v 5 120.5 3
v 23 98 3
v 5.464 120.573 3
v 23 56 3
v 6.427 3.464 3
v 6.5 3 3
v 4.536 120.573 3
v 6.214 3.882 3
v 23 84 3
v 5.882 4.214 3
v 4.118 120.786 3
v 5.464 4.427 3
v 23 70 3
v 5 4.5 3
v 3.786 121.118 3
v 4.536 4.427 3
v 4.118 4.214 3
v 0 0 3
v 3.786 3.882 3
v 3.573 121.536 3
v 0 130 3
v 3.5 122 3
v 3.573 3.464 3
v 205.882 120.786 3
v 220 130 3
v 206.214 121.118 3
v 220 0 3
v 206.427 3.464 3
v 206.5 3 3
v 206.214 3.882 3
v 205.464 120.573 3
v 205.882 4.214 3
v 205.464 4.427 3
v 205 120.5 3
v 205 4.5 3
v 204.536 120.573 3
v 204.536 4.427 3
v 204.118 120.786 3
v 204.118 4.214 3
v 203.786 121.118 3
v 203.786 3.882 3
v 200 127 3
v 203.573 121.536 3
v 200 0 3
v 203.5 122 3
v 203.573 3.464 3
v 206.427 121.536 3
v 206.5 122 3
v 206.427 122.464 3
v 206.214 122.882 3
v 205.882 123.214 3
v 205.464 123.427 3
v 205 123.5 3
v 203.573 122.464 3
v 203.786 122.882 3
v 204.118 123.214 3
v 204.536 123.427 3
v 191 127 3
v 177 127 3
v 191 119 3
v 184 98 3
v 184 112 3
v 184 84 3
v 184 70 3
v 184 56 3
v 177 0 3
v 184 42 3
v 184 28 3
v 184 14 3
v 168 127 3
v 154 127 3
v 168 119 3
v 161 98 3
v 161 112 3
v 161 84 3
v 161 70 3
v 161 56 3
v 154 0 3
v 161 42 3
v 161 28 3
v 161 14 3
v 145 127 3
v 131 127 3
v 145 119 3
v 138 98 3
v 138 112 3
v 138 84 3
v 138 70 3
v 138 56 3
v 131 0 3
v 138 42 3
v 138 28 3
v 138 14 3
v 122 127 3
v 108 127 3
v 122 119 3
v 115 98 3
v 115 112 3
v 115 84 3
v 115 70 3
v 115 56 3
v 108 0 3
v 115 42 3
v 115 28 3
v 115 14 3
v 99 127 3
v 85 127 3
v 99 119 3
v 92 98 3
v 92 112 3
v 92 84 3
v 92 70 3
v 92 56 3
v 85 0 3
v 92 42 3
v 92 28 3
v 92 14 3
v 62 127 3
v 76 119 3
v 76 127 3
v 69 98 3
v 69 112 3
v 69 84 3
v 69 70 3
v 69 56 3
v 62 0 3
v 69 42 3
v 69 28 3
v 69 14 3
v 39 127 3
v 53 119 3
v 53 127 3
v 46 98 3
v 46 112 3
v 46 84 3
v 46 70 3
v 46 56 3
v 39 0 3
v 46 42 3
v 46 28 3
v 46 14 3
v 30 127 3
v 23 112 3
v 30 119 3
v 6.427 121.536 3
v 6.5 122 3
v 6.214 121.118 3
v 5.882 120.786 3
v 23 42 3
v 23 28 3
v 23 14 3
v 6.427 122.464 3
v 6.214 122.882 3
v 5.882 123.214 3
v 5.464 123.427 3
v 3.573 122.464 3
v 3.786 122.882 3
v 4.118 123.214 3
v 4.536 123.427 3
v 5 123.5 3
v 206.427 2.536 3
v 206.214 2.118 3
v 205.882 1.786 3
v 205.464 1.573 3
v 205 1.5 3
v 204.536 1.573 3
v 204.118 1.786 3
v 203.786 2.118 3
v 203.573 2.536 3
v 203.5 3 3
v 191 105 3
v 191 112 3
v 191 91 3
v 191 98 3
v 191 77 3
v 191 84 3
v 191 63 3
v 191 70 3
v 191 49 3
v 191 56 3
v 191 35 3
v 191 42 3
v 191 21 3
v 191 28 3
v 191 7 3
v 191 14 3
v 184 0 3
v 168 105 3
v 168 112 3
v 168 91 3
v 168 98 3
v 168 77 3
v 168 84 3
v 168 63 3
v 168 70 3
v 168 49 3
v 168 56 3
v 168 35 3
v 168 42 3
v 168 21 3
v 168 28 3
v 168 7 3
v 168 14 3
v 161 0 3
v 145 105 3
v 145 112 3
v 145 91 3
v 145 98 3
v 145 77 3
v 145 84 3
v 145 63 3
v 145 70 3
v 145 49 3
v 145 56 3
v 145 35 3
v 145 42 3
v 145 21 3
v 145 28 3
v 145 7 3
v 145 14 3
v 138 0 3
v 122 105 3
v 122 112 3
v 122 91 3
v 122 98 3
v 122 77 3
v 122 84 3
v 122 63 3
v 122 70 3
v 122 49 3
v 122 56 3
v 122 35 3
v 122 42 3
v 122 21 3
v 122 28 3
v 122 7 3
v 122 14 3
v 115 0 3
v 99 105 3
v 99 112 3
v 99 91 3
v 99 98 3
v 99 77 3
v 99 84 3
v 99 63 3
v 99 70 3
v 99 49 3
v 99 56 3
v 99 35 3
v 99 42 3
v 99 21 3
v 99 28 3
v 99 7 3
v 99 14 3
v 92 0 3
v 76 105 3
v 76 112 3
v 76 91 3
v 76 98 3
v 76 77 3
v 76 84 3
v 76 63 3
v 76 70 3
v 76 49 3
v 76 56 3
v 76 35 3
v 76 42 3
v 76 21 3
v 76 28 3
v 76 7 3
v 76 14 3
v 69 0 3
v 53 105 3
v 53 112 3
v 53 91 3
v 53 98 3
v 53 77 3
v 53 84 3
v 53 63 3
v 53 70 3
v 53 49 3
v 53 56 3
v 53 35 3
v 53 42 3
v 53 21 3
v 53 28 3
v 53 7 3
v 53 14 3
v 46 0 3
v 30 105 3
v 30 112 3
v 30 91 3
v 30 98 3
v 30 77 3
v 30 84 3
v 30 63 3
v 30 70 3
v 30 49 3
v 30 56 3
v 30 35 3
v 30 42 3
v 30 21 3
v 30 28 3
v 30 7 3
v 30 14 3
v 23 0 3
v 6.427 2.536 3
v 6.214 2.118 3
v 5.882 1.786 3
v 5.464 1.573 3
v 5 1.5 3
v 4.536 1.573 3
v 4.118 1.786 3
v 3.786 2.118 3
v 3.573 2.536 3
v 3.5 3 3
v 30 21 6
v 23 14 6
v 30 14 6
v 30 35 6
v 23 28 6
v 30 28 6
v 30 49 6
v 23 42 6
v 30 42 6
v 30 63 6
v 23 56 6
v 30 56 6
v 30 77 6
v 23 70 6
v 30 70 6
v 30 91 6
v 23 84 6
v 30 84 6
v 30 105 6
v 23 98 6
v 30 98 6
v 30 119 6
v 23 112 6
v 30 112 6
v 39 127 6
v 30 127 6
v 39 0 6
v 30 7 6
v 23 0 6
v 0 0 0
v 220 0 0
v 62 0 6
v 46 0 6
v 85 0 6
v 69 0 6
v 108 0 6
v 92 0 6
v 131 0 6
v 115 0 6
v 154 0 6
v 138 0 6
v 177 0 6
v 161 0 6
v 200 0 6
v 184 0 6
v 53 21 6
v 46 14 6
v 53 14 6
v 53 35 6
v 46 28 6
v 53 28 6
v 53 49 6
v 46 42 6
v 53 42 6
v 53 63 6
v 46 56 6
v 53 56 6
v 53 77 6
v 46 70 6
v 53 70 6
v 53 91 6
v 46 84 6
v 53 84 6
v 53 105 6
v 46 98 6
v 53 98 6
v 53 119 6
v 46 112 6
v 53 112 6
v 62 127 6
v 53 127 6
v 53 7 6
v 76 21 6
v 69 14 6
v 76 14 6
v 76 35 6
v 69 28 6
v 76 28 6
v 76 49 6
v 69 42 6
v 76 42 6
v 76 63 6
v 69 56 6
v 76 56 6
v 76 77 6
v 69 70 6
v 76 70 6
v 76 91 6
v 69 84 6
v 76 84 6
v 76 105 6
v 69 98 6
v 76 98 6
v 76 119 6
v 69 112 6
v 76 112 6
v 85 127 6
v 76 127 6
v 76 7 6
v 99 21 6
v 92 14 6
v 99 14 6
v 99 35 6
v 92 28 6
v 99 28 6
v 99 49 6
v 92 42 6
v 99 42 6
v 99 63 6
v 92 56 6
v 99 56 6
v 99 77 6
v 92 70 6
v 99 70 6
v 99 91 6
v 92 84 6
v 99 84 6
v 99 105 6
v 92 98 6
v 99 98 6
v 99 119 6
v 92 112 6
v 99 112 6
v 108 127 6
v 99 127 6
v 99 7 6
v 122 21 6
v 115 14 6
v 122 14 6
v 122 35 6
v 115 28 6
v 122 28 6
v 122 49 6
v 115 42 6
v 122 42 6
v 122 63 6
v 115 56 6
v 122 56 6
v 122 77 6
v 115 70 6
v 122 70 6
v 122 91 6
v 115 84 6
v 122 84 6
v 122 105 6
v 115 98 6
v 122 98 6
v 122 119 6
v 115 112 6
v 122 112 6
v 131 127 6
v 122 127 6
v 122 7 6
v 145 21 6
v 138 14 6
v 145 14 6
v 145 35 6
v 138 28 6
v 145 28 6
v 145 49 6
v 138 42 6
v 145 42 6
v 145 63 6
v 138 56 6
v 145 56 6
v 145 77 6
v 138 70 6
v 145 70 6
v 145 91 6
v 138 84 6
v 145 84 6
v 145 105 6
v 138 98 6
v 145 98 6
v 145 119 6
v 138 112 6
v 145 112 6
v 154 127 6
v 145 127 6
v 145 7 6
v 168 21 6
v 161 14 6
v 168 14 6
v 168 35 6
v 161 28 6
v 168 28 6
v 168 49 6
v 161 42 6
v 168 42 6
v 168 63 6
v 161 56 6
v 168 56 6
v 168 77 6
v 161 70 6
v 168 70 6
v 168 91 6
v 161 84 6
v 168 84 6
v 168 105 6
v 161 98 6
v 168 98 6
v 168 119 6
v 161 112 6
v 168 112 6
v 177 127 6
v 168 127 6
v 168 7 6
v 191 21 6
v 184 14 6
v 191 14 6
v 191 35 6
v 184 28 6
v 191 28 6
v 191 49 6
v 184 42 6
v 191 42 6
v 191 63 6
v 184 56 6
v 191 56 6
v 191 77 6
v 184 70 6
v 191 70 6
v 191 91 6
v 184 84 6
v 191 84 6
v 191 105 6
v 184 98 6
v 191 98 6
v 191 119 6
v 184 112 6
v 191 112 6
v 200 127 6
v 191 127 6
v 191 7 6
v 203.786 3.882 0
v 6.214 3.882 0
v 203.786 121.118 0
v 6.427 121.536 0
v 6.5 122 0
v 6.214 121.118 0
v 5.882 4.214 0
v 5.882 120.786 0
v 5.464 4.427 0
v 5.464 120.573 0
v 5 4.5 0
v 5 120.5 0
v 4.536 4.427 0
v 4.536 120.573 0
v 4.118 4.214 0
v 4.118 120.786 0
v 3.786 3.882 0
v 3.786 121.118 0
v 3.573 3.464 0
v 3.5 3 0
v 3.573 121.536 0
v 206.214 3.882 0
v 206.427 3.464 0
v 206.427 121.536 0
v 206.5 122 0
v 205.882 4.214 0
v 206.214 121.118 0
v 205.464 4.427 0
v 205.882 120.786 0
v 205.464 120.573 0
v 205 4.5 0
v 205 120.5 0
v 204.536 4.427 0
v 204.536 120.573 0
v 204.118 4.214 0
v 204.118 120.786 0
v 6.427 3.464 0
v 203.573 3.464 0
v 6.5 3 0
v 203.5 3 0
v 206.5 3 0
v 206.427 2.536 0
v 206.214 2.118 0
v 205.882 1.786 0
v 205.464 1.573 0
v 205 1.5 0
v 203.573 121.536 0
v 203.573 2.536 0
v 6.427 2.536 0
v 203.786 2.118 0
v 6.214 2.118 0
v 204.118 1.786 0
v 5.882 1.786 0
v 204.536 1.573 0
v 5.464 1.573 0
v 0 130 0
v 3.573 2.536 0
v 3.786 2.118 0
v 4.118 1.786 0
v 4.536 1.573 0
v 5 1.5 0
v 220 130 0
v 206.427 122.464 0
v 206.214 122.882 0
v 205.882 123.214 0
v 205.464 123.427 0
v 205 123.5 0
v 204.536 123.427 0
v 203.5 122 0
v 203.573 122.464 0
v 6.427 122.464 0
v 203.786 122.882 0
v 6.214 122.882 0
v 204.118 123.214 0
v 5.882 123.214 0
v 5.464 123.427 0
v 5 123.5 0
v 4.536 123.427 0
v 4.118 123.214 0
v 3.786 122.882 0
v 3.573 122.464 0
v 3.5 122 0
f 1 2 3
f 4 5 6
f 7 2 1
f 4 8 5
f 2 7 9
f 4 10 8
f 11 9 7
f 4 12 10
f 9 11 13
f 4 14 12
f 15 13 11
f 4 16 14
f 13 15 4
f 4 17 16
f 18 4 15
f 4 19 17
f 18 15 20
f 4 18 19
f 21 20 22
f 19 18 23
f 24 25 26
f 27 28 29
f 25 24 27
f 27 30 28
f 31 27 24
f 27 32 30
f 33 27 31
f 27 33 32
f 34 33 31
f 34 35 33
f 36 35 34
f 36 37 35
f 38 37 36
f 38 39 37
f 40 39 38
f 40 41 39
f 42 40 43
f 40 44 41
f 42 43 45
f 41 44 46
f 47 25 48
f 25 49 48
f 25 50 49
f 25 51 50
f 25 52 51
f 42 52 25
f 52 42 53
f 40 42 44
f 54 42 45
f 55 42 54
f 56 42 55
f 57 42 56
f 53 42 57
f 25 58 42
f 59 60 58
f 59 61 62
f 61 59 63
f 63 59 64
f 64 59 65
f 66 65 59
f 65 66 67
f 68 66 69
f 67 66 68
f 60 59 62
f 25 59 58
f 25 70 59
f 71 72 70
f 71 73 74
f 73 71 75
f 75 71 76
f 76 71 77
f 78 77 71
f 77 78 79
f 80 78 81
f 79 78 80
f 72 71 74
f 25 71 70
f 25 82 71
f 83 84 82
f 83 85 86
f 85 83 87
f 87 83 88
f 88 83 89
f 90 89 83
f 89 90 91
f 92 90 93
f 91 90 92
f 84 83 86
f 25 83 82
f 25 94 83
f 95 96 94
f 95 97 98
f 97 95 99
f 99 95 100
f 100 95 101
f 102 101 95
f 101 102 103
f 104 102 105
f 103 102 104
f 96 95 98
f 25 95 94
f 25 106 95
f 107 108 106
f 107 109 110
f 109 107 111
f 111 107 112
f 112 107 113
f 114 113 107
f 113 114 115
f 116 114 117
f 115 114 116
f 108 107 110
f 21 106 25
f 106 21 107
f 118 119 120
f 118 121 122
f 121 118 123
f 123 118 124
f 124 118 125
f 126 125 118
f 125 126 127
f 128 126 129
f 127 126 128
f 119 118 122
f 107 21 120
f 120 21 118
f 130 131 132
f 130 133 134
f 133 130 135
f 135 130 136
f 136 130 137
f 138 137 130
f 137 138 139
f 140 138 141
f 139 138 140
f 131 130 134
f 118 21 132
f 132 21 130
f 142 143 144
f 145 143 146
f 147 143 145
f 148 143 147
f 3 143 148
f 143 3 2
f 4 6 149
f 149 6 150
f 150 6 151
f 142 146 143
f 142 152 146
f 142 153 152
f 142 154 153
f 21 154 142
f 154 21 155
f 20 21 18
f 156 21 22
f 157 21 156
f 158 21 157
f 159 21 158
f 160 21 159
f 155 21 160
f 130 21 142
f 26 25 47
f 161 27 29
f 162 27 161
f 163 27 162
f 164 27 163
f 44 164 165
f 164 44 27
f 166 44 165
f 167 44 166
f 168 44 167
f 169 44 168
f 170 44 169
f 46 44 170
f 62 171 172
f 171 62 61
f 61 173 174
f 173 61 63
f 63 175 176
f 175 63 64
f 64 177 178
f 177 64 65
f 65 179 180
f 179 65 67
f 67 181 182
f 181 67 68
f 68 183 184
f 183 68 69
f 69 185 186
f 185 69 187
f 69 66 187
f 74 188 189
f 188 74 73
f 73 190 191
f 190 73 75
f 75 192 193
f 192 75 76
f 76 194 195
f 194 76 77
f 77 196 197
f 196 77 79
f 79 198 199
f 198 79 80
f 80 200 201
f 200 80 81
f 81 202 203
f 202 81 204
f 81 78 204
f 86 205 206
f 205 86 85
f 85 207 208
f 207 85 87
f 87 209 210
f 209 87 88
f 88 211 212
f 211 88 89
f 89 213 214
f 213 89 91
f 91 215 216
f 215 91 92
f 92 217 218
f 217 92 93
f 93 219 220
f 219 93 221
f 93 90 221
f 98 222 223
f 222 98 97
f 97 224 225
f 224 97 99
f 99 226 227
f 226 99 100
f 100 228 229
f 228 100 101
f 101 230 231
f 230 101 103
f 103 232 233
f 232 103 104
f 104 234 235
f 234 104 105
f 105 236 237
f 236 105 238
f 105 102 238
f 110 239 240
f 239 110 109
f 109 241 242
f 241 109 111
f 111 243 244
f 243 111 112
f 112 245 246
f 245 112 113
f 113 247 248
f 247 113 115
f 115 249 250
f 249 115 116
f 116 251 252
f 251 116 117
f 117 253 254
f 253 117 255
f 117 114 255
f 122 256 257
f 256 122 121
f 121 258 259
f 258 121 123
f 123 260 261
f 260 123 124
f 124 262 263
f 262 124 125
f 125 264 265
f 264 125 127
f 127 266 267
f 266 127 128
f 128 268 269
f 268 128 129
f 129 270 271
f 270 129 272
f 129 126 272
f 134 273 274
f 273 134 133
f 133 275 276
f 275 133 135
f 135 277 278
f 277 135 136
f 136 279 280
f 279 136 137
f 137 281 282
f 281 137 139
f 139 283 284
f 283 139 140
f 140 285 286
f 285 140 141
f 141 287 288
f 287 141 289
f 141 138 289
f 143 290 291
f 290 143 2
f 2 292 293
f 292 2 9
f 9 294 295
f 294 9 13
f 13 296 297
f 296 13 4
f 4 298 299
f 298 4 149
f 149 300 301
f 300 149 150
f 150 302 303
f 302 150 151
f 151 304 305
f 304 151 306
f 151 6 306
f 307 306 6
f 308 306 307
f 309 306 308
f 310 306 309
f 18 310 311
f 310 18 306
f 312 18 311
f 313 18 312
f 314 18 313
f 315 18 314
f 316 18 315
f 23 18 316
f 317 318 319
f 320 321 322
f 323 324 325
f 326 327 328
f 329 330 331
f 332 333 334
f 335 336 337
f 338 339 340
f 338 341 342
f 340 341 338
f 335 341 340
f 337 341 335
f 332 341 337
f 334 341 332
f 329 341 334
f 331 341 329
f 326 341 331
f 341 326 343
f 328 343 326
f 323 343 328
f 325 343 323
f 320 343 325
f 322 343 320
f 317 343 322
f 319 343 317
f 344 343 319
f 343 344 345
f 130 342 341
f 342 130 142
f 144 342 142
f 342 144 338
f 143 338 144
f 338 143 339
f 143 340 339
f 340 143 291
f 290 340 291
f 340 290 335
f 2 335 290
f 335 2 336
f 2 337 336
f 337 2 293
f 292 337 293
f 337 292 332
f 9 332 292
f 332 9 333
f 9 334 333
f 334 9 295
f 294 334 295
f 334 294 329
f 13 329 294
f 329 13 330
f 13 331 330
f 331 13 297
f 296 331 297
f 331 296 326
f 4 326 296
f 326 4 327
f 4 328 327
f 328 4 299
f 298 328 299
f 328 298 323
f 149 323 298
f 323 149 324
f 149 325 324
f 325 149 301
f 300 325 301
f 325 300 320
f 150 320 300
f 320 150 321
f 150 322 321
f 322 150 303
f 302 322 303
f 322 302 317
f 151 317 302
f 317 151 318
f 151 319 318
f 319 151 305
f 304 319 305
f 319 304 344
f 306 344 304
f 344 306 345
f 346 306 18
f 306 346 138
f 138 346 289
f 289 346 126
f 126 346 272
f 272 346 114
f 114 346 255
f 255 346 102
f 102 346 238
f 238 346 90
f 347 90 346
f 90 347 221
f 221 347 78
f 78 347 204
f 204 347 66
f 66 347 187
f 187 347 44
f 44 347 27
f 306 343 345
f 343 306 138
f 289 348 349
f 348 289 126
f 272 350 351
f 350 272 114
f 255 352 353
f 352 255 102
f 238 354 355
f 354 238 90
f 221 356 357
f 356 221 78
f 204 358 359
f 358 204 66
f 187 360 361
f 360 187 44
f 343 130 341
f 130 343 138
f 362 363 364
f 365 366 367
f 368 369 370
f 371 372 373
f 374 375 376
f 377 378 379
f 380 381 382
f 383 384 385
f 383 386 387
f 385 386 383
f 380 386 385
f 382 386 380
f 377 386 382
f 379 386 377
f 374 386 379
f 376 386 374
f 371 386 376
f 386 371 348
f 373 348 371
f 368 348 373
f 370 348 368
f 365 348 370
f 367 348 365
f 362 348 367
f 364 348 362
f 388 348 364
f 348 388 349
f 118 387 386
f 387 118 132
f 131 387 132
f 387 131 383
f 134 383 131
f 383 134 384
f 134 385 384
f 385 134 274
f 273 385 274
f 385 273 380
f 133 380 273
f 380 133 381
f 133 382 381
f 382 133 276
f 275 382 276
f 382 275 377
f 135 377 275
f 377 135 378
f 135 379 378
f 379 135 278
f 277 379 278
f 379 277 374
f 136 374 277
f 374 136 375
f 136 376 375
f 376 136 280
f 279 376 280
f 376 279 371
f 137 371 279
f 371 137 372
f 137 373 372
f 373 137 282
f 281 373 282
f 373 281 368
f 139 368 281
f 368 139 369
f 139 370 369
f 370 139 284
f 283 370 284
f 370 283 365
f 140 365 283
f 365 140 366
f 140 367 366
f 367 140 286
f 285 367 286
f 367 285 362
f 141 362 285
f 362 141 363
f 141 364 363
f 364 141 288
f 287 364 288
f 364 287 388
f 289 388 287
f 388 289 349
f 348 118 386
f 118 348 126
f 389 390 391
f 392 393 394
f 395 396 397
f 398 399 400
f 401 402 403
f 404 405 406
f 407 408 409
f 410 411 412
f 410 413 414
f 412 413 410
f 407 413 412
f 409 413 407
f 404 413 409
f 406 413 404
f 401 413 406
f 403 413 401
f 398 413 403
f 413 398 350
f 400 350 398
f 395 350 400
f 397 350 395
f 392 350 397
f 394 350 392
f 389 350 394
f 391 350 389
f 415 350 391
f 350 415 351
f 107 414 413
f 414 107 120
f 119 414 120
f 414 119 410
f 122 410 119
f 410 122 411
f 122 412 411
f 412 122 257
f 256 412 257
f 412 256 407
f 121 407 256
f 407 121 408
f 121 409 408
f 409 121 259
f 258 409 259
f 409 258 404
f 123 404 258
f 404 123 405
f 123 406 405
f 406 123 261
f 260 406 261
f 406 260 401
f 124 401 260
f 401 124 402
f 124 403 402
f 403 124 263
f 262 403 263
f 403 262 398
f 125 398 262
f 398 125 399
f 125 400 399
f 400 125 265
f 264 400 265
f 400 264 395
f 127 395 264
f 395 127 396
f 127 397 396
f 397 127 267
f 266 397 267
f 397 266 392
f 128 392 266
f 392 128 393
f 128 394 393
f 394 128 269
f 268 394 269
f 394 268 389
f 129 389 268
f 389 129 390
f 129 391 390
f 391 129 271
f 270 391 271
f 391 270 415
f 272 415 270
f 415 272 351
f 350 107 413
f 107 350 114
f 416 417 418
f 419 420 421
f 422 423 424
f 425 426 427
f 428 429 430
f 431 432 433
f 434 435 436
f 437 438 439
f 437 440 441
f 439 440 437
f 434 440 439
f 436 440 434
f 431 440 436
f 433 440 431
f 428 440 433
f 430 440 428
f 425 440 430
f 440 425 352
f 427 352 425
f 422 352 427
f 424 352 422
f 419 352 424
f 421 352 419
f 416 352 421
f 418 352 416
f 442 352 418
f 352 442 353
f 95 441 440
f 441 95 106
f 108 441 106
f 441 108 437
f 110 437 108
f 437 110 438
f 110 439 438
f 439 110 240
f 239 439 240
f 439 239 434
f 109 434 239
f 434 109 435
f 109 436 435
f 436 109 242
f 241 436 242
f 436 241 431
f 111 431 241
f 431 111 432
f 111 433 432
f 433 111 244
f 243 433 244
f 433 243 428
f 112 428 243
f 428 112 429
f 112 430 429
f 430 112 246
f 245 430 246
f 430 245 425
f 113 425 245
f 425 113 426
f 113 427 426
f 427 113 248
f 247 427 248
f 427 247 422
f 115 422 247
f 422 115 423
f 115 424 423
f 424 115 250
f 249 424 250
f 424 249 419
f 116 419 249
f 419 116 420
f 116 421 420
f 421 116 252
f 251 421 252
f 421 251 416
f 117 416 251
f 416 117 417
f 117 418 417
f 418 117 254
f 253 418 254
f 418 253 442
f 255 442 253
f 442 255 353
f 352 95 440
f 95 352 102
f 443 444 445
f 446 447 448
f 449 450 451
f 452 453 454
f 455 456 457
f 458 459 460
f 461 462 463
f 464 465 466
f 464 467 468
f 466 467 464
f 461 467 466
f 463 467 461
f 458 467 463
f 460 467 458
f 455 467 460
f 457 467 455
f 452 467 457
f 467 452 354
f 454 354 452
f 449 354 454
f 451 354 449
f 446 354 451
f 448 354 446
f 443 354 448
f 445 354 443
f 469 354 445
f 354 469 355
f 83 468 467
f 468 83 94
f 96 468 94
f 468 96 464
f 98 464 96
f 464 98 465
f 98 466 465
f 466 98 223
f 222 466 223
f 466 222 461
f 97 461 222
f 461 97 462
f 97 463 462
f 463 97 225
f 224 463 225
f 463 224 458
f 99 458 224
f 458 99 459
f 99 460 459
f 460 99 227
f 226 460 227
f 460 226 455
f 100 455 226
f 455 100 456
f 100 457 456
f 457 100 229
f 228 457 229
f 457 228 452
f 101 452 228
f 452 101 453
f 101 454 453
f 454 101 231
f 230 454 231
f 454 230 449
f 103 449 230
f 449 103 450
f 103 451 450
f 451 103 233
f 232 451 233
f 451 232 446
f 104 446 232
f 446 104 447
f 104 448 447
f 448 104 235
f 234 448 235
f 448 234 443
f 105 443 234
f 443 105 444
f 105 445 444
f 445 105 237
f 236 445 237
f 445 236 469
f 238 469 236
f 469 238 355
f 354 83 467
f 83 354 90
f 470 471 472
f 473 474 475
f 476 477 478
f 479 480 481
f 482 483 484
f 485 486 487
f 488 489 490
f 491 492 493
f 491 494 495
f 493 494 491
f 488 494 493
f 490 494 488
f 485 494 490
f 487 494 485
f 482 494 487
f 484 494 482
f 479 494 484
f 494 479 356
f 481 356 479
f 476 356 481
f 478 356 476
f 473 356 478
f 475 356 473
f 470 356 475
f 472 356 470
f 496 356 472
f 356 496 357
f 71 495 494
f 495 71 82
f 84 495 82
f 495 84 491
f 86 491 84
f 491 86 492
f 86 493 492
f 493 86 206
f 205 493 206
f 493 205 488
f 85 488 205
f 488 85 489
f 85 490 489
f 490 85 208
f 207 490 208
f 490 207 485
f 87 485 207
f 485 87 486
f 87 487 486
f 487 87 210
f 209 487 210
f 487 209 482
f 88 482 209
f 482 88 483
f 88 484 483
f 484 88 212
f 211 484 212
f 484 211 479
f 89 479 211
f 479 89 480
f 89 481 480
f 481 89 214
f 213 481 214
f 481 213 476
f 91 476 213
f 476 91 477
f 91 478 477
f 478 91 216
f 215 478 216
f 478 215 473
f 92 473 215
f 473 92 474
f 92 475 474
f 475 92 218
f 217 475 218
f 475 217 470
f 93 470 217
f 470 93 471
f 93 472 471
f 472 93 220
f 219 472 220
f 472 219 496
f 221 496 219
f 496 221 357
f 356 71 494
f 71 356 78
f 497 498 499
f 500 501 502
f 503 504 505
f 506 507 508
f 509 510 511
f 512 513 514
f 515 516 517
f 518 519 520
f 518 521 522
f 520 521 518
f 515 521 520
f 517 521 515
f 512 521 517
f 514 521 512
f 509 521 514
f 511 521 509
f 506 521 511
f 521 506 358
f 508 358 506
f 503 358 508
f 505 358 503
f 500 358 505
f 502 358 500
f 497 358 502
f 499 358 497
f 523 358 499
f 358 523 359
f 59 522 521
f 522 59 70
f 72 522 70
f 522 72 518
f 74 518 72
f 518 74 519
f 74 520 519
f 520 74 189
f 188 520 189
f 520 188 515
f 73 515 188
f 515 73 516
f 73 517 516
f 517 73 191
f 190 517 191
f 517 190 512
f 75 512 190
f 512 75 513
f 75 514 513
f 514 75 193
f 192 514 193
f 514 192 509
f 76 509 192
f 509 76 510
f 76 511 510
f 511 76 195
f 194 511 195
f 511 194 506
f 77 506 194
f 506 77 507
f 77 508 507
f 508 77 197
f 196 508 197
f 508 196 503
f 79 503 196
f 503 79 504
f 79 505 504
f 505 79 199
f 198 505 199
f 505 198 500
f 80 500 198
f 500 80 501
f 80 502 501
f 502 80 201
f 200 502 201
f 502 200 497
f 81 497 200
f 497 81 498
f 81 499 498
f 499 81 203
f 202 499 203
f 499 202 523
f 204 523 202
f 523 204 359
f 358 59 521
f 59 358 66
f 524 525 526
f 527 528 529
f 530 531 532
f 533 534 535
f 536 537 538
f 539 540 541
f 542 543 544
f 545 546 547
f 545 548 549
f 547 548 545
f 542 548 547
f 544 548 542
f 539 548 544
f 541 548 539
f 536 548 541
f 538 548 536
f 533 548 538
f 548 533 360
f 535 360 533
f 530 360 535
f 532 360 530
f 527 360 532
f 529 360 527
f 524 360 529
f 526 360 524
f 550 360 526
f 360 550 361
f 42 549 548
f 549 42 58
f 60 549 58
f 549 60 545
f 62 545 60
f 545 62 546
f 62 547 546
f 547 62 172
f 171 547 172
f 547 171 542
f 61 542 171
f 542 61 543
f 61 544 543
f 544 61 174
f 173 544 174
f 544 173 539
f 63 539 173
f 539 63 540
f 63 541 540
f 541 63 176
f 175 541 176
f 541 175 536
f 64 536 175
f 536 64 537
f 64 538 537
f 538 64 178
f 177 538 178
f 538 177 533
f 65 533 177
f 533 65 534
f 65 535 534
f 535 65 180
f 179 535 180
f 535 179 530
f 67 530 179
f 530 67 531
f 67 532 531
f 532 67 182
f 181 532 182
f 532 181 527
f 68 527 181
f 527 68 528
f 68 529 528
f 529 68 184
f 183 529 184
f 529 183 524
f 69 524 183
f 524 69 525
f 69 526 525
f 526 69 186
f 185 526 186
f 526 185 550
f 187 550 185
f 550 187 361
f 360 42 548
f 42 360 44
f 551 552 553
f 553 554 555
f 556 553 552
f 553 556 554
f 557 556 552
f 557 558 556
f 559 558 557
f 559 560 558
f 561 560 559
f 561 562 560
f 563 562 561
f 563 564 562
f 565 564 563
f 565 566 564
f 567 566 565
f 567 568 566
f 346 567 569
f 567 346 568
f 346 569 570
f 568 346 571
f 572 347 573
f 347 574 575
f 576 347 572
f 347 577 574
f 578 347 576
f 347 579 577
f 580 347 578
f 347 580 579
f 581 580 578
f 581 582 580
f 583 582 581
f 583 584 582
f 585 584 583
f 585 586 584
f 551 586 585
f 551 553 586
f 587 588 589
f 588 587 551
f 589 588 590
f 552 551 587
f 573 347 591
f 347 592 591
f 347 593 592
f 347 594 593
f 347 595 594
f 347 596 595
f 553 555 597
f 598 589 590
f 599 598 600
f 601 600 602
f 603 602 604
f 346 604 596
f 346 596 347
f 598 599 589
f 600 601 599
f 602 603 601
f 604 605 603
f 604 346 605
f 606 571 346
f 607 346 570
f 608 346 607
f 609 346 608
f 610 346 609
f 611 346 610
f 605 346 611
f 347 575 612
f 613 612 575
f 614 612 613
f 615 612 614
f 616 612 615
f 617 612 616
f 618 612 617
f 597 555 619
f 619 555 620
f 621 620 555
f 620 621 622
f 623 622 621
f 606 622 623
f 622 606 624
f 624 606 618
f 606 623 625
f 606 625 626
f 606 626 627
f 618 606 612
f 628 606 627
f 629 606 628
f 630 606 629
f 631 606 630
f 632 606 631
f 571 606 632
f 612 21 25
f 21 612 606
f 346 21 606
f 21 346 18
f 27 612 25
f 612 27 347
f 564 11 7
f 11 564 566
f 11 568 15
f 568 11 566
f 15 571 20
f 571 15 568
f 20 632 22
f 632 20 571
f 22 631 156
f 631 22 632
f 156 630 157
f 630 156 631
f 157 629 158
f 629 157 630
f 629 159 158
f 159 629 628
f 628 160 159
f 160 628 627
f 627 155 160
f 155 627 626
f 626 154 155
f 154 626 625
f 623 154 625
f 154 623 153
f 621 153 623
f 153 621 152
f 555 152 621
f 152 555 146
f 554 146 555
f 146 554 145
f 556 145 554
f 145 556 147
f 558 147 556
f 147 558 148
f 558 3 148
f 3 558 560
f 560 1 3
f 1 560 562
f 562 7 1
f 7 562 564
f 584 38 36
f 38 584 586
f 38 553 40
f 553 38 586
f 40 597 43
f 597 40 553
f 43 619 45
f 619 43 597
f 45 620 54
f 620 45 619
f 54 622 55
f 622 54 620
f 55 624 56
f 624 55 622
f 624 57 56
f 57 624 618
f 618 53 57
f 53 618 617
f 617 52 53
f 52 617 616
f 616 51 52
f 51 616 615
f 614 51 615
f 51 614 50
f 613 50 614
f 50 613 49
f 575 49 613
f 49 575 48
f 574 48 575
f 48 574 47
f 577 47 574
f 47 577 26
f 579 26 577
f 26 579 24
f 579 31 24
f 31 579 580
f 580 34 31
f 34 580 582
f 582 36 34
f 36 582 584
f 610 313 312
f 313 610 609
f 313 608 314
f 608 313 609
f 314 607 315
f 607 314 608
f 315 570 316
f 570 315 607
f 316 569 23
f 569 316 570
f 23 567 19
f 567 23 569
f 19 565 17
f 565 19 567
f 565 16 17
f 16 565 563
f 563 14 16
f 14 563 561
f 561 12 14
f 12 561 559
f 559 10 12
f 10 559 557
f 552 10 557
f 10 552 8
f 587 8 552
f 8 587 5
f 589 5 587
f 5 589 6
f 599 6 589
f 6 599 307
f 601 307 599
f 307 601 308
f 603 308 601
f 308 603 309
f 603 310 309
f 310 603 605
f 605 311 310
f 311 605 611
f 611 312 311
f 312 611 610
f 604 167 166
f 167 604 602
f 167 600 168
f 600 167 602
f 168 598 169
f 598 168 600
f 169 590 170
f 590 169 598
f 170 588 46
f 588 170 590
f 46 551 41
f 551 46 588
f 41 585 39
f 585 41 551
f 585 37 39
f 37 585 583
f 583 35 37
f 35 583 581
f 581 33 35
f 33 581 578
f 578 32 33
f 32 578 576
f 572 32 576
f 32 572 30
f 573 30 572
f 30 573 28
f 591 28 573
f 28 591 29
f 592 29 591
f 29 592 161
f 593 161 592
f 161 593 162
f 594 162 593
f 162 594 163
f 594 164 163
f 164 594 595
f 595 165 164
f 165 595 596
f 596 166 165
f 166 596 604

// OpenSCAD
// file: globs.scad
/* Global definitions for millihertz 5 */

// Ball bearings are sold as 6mm. We have seen two
// versions, one at 6.35mm (1/4") and one at 6.15mm.

ball_bearing_diameter = 6.35;
ball_bearing_radius = ball_bearing_diameter / 2;
pipe_outer_diameter = 11;

/* All dimensions are in millimetres */
memory_slope = 10; // Degrees

/** Memory cell pitch - the horizontal and vertical distances between one row and the next. Memory is arranged so one column (y) make up one word. Words are laid out vertically. */
memory_cell_pitch_x = 16;
memory_cell_pitch_y = 28 * cos(memory_slope);

// Max wire diameter is 1.59mm for 6.35mm ball bearings.
stage1_wire_diameter = 1.45; // Equivalent to AWG 15 / SWG 17.
stage2_wire_diameter = 2.337; // SWG 13

/* Number of bits used in the data. This must be 32. */
bits = 32;

/* Global pitch - the horizontal spacing between each bit */
pitch = 23;

/** Frame */

frame_internal_width = 900;
frame_internal_height = 2200;

/** Frame will probably be 50mm angle iron */
frame_width = 50;

/* Bowden cable specs based on lightweight 'snake' cable */

bowden_cable_inner_diameter = 2;
bowden_cable_outer_diameter = 3.5;

bowden_cable_travel = 10;

/* Specific names for the subtractor */
subtractor_pitch_x = pitch;
subtractor_pitch_y = 27;

memory_columns_per_cell = 8;

// Memory cell height
cell_height = 14;

// Gap between two memory cell units - allows for the last useless row
// in the cell and a gap of 20 to place a delay unit if necessary. The
// delay unit may be needed to slow the ball bearing to avoid damage to
// memory selectors.
memory_unit_gap = cell_height+20;

// centre_gap is a split in the middle of the two lanes
// to join cells together (since we will likely have two
// 16-bit memory cells, and 2 16-bit adders, there will
// be a gap needed to join them.
centre_gap = 50;

/* Colour for illustrating ball bearing paths */

bb_trace_colour = [0.5,0.0,0.0,0.5];


channel_width = 7; // Width of channels ball bearings roll in

columns_per_block = 8; // Number of columns in each injector/diverter block

// Used mainly by injector
function ejector_xpos(col) = 20+col*pitch+channel_width/2;
// main file
/* Vertical configurable memory cell, 3D assembly; second version with
   less manual assembly less possibility of binding */

include <globs.scad>;

columns = memory_columns_per_cell;
rows = 8;
column_width = 7; // Must be bigger than bb diameter

joiner_extension = 2;
column_spacing = (column_width*3+joiner_extension); // This is no longer relevant, but necessary to calculate the mounting holes

module base_plate_2d()
{
  difference() {
    square([220,130]);

    // Mounting holes to match the v1 vertical memory
    for(x=[5, column_spacing*columns+21]) {
      translate([x,3]) circle(d=3,$fn=20);
      translate([x,cell_height*rows+10]) circle(d=3,$fn=20);
    }
  }
}

module deflector_cell_2d() {
  polygon(points=[[7,-1], [7,7], [0,14], [14+joiner_extension,14], [14+joiner_extension,-1]]);
}

module deflector_line_2d() {
  union() {
    for(y=[0:rows]) {
      translate([0,y*cell_height]) deflector_cell_2d();
    }

  }
}

module 3d_assembly() {
  linear_extrude(height=3) base_plate_2d();

  for(x=[1:columns]) {
    translate([pitch*x,14*(rows+1),3]) color([1.0,0,0]) linear_extrude(height=3) scale([1,-1]) deflector_line_2d();
  }
}


3d_assembly();
